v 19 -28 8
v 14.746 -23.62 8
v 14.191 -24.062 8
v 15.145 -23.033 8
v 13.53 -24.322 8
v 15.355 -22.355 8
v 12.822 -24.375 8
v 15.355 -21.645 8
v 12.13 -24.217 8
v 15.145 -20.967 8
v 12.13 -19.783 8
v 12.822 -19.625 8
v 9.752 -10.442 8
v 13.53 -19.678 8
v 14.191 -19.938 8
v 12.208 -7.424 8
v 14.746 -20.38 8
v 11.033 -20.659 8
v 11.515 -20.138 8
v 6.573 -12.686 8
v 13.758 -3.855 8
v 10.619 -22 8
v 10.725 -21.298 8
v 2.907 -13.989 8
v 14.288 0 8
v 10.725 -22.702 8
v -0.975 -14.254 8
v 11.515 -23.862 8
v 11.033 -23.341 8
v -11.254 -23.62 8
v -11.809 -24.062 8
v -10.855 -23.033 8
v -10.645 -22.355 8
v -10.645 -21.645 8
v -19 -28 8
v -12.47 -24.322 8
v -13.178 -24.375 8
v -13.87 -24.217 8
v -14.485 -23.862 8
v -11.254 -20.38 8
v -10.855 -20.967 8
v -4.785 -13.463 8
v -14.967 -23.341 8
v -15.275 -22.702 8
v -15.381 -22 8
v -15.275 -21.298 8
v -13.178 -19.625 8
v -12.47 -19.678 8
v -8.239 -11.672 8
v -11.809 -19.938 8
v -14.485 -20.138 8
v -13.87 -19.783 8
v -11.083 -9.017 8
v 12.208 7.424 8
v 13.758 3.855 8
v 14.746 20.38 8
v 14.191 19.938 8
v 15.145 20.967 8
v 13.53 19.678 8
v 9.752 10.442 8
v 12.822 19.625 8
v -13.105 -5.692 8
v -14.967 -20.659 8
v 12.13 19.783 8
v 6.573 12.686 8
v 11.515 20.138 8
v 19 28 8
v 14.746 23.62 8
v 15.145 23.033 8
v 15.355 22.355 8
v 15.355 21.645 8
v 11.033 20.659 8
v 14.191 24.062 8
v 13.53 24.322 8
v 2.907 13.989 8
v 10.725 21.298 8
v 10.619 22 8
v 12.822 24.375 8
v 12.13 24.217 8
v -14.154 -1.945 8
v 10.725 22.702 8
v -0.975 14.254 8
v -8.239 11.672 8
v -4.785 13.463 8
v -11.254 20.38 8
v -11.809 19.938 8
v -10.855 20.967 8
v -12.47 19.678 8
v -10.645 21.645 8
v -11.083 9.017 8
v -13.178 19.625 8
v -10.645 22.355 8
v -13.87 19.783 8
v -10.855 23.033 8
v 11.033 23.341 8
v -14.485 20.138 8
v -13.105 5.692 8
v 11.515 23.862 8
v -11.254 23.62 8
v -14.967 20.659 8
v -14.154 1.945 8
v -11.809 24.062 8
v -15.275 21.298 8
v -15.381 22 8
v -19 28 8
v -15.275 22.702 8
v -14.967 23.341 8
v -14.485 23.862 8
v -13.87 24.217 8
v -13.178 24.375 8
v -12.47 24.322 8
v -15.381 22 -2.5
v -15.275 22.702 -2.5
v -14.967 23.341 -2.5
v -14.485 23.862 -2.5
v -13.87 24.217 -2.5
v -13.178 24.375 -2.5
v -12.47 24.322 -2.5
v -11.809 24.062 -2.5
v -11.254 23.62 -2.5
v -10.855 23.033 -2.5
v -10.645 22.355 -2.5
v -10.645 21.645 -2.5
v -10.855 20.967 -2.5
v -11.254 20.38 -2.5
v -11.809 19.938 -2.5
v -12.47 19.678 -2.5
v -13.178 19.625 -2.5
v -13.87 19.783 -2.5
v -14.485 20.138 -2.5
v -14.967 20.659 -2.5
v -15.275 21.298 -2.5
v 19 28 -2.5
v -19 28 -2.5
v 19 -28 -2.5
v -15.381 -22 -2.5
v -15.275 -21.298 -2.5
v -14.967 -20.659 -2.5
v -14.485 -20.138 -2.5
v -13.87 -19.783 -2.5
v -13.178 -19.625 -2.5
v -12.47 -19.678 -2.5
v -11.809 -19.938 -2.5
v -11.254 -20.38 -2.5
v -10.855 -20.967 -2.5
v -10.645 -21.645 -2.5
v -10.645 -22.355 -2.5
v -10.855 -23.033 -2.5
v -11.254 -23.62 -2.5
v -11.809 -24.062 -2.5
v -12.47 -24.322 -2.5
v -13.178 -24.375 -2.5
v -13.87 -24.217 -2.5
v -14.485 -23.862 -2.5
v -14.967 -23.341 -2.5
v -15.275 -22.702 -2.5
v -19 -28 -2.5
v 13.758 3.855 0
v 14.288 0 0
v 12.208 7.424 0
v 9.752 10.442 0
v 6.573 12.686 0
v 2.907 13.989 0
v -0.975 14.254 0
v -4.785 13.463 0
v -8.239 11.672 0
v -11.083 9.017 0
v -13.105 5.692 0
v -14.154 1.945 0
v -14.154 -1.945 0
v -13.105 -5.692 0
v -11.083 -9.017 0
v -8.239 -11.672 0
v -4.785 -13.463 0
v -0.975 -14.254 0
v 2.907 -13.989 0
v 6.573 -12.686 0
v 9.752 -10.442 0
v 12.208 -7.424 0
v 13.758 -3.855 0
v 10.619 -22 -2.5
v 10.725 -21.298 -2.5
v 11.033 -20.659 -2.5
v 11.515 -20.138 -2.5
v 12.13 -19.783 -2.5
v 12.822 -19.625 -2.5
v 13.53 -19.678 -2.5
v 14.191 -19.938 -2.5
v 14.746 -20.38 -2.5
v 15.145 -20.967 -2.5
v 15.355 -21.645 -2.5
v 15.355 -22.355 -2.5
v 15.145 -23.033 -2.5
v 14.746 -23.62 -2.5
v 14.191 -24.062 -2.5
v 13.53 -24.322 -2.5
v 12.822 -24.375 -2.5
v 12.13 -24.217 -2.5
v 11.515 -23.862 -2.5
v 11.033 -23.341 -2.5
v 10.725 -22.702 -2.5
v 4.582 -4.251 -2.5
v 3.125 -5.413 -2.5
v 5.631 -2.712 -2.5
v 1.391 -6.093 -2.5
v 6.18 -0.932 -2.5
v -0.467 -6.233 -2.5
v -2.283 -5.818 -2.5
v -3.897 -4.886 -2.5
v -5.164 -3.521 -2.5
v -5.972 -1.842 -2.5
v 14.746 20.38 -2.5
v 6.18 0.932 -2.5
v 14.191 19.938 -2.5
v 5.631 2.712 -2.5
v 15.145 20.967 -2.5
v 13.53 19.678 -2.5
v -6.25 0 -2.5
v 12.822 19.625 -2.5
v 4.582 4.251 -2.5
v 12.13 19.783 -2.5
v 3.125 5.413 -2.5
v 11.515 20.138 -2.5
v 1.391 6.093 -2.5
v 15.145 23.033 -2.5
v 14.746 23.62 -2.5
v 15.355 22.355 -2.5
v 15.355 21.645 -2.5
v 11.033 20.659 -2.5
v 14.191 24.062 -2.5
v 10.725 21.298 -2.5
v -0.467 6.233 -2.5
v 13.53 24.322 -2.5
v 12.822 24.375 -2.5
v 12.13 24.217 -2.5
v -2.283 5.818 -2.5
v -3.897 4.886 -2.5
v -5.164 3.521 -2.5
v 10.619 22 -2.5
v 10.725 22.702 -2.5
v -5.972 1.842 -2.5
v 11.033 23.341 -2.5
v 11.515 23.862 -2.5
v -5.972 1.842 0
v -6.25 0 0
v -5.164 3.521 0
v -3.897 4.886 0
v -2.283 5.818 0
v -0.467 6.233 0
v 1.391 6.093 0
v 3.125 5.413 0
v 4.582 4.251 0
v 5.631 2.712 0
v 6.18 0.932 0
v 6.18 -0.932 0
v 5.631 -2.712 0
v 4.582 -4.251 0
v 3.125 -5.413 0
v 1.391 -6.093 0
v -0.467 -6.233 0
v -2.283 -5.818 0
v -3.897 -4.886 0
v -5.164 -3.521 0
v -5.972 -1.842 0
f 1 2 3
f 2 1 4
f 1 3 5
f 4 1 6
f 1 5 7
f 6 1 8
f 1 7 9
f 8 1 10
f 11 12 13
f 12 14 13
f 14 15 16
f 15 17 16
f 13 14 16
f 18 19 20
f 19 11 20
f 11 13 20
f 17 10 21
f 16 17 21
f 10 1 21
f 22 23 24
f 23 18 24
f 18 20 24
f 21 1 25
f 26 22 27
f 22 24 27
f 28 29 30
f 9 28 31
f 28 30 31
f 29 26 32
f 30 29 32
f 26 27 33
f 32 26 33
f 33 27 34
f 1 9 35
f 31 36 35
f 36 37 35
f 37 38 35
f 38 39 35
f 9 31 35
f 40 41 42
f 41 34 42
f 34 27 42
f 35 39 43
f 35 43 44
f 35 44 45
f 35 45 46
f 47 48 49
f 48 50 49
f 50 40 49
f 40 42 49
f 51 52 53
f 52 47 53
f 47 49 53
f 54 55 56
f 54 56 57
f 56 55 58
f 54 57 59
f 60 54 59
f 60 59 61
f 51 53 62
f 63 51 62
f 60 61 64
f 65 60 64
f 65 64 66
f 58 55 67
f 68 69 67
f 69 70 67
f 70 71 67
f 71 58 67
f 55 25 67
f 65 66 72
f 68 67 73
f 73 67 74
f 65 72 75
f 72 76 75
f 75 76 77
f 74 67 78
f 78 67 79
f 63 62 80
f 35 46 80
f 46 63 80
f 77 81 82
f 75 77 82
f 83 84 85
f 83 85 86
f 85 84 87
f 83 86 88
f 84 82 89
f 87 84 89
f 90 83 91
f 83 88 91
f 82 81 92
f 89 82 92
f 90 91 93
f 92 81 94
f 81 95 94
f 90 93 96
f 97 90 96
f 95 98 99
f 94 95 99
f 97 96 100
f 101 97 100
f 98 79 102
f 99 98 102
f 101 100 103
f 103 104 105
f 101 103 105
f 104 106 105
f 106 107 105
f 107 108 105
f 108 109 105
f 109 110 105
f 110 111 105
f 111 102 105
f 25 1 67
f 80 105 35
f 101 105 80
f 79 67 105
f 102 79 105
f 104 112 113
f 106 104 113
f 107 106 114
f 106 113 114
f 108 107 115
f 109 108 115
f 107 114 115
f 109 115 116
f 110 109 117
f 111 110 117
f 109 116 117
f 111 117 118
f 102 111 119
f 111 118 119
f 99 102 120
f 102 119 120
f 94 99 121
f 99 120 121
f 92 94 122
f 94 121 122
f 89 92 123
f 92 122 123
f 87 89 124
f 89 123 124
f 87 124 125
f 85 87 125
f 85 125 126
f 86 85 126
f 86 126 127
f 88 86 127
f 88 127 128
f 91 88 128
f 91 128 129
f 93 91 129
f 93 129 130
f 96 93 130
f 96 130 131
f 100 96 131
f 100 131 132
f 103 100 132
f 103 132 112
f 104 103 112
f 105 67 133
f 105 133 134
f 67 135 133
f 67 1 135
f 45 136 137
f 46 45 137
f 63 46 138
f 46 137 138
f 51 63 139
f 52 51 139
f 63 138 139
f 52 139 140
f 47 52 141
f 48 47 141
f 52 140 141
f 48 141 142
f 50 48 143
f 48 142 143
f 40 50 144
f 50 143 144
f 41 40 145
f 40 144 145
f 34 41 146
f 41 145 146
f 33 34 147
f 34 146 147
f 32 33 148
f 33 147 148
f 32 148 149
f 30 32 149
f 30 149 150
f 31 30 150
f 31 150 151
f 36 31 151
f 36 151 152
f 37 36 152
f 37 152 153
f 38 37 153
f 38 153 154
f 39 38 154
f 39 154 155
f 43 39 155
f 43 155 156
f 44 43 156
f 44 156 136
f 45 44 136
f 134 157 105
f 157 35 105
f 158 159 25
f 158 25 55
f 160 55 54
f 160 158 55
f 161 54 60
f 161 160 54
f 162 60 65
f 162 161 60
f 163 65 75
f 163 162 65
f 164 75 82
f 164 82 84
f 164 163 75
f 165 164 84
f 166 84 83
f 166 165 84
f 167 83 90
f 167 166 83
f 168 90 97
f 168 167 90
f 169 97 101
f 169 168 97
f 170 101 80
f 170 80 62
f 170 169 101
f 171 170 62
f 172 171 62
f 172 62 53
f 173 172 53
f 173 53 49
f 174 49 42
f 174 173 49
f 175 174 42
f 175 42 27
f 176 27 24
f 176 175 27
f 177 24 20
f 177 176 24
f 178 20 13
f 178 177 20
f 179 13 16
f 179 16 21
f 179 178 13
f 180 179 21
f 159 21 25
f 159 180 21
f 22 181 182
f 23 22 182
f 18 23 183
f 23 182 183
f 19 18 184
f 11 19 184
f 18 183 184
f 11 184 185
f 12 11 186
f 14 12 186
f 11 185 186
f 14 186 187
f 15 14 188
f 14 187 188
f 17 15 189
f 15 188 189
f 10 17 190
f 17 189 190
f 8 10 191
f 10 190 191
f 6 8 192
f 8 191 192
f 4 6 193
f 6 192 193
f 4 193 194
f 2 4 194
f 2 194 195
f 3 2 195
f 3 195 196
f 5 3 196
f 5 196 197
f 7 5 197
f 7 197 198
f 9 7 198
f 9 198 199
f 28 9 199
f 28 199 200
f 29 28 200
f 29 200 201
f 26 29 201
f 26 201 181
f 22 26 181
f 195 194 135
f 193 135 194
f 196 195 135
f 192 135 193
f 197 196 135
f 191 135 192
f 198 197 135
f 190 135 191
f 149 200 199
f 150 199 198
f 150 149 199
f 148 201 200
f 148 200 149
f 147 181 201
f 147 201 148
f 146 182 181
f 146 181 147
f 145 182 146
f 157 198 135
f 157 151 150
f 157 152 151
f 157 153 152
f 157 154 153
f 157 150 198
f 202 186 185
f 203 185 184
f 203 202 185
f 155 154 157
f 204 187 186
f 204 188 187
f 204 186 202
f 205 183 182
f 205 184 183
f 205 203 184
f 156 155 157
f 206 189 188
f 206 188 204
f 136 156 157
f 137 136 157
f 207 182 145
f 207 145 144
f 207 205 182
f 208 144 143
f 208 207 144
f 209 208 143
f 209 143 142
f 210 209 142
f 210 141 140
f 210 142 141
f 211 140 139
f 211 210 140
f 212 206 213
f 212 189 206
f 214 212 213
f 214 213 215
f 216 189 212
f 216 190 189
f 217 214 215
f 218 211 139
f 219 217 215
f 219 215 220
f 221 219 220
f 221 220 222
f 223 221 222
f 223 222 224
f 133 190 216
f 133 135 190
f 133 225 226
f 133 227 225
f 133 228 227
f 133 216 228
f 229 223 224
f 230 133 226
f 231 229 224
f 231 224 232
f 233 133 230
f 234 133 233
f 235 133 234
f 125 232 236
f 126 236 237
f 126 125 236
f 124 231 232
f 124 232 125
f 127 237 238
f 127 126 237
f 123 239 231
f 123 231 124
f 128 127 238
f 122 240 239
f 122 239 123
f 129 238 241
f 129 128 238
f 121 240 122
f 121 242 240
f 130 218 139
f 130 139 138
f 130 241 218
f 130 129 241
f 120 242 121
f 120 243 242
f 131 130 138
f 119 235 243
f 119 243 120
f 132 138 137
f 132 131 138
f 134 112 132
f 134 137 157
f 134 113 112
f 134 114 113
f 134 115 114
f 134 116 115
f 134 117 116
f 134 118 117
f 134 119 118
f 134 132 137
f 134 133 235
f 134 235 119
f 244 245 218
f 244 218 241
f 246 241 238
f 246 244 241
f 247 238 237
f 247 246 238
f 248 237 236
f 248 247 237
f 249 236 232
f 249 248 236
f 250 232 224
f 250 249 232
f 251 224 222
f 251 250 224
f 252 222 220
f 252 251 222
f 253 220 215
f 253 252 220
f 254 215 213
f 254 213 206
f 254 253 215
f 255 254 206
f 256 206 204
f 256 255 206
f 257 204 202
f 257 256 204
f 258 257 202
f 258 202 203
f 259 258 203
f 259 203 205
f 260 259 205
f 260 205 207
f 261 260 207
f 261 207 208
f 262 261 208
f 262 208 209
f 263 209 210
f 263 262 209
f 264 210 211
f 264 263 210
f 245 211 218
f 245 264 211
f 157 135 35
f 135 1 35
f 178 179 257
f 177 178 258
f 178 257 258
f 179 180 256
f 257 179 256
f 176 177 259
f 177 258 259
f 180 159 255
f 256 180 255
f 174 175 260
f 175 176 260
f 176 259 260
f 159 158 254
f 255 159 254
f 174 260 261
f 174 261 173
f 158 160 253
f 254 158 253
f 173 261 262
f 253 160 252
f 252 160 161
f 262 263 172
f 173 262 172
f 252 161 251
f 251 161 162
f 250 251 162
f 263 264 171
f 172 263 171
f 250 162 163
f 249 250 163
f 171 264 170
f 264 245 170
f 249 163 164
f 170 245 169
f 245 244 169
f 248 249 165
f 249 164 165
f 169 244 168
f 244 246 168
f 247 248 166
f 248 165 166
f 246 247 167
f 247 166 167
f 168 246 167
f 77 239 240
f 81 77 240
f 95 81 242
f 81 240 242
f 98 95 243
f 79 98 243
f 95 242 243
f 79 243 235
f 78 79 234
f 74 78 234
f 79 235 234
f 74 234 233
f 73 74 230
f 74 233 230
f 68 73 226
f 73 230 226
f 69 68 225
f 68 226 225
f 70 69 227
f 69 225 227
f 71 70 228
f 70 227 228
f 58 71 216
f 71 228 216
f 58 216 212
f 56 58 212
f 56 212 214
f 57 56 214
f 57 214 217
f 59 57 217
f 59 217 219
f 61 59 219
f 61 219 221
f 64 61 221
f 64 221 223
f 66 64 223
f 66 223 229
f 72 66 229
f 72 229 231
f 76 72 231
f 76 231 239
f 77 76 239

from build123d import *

# Parameters (mm, degrees)
CROQUIS1_R              = 18.2875
CROQUIS1_R_2            = 14.2875
SALIENTE_EXTRUIR1_DEPTH = 8
CROQUIS2_W              = 38
CROQUIS2_H              = 56
CROQUIS2_R              = 18.2875
SALIENTE_EXTRUIR2_DEPTH = 8
CROQUIS5_W              = 38
CROQUIS5_H              = 56
CROQUIS5_R              = 6.25
SALIENTE_EXTRUIR3_DEPTH = 2.5
CROQUIS7_R              = 2.38125
CORTAR_EXTRUIR3_DEPTH   = 11.5


with BuildPart() as part:
    # Croquis1 → Saliente-Extruir1 (new body)
    with BuildSketch(Plane.XY):
        Circle(CROQUIS1_R)
        Circle(CROQUIS1_R_2, mode=Mode.SUBTRACT)
    extrude(amount=SALIENTE_EXTRUIR1_DEPTH)

    # Croquis2 → Saliente-Extruir2 (add)
    with BuildSketch(Plane(origin=(0, 0, 0), x_dir=(-1, 0, 0), z_dir=(0, 0, -1))):
        Rectangle(CROQUIS2_W, CROQUIS2_H)
        Circle(CROQUIS2_R, mode=Mode.SUBTRACT)
    extrude(amount=-SALIENTE_EXTRUIR2_DEPTH)

    # Croquis5 → Saliente-Extruir3 (add)
    with BuildSketch(Plane(origin=(0, 0, 0), x_dir=(-1, 0, 0), z_dir=(0, 0, -1))):
        Rectangle(CROQUIS5_W, CROQUIS5_H)
        Circle(CROQUIS5_R, mode=Mode.SUBTRACT)
    extrude(amount=SALIENTE_EXTRUIR3_DEPTH)

    # Croquis7 → Cortar-Extruir3 (cut, through all)
    with BuildSketch(Plane(origin=(0, 0, -2.5), x_dir=(-1, 0, 0), z_dir=(0, 0, -1))):
        with Locations((-13, 22)):
            Circle(CROQUIS7_R)
        with Locations((13, 22)):
            Circle(CROQUIS7_R)
        with Locations((13, -22)):
            Circle(CROQUIS7_R)
        with Locations((-13, -22)):
            Circle(CROQUIS7_R)
    extrude(amount=-CORTAR_EXTRUIR3_DEPTH, mode=Mode.SUBTRACT)


solid = part.part
